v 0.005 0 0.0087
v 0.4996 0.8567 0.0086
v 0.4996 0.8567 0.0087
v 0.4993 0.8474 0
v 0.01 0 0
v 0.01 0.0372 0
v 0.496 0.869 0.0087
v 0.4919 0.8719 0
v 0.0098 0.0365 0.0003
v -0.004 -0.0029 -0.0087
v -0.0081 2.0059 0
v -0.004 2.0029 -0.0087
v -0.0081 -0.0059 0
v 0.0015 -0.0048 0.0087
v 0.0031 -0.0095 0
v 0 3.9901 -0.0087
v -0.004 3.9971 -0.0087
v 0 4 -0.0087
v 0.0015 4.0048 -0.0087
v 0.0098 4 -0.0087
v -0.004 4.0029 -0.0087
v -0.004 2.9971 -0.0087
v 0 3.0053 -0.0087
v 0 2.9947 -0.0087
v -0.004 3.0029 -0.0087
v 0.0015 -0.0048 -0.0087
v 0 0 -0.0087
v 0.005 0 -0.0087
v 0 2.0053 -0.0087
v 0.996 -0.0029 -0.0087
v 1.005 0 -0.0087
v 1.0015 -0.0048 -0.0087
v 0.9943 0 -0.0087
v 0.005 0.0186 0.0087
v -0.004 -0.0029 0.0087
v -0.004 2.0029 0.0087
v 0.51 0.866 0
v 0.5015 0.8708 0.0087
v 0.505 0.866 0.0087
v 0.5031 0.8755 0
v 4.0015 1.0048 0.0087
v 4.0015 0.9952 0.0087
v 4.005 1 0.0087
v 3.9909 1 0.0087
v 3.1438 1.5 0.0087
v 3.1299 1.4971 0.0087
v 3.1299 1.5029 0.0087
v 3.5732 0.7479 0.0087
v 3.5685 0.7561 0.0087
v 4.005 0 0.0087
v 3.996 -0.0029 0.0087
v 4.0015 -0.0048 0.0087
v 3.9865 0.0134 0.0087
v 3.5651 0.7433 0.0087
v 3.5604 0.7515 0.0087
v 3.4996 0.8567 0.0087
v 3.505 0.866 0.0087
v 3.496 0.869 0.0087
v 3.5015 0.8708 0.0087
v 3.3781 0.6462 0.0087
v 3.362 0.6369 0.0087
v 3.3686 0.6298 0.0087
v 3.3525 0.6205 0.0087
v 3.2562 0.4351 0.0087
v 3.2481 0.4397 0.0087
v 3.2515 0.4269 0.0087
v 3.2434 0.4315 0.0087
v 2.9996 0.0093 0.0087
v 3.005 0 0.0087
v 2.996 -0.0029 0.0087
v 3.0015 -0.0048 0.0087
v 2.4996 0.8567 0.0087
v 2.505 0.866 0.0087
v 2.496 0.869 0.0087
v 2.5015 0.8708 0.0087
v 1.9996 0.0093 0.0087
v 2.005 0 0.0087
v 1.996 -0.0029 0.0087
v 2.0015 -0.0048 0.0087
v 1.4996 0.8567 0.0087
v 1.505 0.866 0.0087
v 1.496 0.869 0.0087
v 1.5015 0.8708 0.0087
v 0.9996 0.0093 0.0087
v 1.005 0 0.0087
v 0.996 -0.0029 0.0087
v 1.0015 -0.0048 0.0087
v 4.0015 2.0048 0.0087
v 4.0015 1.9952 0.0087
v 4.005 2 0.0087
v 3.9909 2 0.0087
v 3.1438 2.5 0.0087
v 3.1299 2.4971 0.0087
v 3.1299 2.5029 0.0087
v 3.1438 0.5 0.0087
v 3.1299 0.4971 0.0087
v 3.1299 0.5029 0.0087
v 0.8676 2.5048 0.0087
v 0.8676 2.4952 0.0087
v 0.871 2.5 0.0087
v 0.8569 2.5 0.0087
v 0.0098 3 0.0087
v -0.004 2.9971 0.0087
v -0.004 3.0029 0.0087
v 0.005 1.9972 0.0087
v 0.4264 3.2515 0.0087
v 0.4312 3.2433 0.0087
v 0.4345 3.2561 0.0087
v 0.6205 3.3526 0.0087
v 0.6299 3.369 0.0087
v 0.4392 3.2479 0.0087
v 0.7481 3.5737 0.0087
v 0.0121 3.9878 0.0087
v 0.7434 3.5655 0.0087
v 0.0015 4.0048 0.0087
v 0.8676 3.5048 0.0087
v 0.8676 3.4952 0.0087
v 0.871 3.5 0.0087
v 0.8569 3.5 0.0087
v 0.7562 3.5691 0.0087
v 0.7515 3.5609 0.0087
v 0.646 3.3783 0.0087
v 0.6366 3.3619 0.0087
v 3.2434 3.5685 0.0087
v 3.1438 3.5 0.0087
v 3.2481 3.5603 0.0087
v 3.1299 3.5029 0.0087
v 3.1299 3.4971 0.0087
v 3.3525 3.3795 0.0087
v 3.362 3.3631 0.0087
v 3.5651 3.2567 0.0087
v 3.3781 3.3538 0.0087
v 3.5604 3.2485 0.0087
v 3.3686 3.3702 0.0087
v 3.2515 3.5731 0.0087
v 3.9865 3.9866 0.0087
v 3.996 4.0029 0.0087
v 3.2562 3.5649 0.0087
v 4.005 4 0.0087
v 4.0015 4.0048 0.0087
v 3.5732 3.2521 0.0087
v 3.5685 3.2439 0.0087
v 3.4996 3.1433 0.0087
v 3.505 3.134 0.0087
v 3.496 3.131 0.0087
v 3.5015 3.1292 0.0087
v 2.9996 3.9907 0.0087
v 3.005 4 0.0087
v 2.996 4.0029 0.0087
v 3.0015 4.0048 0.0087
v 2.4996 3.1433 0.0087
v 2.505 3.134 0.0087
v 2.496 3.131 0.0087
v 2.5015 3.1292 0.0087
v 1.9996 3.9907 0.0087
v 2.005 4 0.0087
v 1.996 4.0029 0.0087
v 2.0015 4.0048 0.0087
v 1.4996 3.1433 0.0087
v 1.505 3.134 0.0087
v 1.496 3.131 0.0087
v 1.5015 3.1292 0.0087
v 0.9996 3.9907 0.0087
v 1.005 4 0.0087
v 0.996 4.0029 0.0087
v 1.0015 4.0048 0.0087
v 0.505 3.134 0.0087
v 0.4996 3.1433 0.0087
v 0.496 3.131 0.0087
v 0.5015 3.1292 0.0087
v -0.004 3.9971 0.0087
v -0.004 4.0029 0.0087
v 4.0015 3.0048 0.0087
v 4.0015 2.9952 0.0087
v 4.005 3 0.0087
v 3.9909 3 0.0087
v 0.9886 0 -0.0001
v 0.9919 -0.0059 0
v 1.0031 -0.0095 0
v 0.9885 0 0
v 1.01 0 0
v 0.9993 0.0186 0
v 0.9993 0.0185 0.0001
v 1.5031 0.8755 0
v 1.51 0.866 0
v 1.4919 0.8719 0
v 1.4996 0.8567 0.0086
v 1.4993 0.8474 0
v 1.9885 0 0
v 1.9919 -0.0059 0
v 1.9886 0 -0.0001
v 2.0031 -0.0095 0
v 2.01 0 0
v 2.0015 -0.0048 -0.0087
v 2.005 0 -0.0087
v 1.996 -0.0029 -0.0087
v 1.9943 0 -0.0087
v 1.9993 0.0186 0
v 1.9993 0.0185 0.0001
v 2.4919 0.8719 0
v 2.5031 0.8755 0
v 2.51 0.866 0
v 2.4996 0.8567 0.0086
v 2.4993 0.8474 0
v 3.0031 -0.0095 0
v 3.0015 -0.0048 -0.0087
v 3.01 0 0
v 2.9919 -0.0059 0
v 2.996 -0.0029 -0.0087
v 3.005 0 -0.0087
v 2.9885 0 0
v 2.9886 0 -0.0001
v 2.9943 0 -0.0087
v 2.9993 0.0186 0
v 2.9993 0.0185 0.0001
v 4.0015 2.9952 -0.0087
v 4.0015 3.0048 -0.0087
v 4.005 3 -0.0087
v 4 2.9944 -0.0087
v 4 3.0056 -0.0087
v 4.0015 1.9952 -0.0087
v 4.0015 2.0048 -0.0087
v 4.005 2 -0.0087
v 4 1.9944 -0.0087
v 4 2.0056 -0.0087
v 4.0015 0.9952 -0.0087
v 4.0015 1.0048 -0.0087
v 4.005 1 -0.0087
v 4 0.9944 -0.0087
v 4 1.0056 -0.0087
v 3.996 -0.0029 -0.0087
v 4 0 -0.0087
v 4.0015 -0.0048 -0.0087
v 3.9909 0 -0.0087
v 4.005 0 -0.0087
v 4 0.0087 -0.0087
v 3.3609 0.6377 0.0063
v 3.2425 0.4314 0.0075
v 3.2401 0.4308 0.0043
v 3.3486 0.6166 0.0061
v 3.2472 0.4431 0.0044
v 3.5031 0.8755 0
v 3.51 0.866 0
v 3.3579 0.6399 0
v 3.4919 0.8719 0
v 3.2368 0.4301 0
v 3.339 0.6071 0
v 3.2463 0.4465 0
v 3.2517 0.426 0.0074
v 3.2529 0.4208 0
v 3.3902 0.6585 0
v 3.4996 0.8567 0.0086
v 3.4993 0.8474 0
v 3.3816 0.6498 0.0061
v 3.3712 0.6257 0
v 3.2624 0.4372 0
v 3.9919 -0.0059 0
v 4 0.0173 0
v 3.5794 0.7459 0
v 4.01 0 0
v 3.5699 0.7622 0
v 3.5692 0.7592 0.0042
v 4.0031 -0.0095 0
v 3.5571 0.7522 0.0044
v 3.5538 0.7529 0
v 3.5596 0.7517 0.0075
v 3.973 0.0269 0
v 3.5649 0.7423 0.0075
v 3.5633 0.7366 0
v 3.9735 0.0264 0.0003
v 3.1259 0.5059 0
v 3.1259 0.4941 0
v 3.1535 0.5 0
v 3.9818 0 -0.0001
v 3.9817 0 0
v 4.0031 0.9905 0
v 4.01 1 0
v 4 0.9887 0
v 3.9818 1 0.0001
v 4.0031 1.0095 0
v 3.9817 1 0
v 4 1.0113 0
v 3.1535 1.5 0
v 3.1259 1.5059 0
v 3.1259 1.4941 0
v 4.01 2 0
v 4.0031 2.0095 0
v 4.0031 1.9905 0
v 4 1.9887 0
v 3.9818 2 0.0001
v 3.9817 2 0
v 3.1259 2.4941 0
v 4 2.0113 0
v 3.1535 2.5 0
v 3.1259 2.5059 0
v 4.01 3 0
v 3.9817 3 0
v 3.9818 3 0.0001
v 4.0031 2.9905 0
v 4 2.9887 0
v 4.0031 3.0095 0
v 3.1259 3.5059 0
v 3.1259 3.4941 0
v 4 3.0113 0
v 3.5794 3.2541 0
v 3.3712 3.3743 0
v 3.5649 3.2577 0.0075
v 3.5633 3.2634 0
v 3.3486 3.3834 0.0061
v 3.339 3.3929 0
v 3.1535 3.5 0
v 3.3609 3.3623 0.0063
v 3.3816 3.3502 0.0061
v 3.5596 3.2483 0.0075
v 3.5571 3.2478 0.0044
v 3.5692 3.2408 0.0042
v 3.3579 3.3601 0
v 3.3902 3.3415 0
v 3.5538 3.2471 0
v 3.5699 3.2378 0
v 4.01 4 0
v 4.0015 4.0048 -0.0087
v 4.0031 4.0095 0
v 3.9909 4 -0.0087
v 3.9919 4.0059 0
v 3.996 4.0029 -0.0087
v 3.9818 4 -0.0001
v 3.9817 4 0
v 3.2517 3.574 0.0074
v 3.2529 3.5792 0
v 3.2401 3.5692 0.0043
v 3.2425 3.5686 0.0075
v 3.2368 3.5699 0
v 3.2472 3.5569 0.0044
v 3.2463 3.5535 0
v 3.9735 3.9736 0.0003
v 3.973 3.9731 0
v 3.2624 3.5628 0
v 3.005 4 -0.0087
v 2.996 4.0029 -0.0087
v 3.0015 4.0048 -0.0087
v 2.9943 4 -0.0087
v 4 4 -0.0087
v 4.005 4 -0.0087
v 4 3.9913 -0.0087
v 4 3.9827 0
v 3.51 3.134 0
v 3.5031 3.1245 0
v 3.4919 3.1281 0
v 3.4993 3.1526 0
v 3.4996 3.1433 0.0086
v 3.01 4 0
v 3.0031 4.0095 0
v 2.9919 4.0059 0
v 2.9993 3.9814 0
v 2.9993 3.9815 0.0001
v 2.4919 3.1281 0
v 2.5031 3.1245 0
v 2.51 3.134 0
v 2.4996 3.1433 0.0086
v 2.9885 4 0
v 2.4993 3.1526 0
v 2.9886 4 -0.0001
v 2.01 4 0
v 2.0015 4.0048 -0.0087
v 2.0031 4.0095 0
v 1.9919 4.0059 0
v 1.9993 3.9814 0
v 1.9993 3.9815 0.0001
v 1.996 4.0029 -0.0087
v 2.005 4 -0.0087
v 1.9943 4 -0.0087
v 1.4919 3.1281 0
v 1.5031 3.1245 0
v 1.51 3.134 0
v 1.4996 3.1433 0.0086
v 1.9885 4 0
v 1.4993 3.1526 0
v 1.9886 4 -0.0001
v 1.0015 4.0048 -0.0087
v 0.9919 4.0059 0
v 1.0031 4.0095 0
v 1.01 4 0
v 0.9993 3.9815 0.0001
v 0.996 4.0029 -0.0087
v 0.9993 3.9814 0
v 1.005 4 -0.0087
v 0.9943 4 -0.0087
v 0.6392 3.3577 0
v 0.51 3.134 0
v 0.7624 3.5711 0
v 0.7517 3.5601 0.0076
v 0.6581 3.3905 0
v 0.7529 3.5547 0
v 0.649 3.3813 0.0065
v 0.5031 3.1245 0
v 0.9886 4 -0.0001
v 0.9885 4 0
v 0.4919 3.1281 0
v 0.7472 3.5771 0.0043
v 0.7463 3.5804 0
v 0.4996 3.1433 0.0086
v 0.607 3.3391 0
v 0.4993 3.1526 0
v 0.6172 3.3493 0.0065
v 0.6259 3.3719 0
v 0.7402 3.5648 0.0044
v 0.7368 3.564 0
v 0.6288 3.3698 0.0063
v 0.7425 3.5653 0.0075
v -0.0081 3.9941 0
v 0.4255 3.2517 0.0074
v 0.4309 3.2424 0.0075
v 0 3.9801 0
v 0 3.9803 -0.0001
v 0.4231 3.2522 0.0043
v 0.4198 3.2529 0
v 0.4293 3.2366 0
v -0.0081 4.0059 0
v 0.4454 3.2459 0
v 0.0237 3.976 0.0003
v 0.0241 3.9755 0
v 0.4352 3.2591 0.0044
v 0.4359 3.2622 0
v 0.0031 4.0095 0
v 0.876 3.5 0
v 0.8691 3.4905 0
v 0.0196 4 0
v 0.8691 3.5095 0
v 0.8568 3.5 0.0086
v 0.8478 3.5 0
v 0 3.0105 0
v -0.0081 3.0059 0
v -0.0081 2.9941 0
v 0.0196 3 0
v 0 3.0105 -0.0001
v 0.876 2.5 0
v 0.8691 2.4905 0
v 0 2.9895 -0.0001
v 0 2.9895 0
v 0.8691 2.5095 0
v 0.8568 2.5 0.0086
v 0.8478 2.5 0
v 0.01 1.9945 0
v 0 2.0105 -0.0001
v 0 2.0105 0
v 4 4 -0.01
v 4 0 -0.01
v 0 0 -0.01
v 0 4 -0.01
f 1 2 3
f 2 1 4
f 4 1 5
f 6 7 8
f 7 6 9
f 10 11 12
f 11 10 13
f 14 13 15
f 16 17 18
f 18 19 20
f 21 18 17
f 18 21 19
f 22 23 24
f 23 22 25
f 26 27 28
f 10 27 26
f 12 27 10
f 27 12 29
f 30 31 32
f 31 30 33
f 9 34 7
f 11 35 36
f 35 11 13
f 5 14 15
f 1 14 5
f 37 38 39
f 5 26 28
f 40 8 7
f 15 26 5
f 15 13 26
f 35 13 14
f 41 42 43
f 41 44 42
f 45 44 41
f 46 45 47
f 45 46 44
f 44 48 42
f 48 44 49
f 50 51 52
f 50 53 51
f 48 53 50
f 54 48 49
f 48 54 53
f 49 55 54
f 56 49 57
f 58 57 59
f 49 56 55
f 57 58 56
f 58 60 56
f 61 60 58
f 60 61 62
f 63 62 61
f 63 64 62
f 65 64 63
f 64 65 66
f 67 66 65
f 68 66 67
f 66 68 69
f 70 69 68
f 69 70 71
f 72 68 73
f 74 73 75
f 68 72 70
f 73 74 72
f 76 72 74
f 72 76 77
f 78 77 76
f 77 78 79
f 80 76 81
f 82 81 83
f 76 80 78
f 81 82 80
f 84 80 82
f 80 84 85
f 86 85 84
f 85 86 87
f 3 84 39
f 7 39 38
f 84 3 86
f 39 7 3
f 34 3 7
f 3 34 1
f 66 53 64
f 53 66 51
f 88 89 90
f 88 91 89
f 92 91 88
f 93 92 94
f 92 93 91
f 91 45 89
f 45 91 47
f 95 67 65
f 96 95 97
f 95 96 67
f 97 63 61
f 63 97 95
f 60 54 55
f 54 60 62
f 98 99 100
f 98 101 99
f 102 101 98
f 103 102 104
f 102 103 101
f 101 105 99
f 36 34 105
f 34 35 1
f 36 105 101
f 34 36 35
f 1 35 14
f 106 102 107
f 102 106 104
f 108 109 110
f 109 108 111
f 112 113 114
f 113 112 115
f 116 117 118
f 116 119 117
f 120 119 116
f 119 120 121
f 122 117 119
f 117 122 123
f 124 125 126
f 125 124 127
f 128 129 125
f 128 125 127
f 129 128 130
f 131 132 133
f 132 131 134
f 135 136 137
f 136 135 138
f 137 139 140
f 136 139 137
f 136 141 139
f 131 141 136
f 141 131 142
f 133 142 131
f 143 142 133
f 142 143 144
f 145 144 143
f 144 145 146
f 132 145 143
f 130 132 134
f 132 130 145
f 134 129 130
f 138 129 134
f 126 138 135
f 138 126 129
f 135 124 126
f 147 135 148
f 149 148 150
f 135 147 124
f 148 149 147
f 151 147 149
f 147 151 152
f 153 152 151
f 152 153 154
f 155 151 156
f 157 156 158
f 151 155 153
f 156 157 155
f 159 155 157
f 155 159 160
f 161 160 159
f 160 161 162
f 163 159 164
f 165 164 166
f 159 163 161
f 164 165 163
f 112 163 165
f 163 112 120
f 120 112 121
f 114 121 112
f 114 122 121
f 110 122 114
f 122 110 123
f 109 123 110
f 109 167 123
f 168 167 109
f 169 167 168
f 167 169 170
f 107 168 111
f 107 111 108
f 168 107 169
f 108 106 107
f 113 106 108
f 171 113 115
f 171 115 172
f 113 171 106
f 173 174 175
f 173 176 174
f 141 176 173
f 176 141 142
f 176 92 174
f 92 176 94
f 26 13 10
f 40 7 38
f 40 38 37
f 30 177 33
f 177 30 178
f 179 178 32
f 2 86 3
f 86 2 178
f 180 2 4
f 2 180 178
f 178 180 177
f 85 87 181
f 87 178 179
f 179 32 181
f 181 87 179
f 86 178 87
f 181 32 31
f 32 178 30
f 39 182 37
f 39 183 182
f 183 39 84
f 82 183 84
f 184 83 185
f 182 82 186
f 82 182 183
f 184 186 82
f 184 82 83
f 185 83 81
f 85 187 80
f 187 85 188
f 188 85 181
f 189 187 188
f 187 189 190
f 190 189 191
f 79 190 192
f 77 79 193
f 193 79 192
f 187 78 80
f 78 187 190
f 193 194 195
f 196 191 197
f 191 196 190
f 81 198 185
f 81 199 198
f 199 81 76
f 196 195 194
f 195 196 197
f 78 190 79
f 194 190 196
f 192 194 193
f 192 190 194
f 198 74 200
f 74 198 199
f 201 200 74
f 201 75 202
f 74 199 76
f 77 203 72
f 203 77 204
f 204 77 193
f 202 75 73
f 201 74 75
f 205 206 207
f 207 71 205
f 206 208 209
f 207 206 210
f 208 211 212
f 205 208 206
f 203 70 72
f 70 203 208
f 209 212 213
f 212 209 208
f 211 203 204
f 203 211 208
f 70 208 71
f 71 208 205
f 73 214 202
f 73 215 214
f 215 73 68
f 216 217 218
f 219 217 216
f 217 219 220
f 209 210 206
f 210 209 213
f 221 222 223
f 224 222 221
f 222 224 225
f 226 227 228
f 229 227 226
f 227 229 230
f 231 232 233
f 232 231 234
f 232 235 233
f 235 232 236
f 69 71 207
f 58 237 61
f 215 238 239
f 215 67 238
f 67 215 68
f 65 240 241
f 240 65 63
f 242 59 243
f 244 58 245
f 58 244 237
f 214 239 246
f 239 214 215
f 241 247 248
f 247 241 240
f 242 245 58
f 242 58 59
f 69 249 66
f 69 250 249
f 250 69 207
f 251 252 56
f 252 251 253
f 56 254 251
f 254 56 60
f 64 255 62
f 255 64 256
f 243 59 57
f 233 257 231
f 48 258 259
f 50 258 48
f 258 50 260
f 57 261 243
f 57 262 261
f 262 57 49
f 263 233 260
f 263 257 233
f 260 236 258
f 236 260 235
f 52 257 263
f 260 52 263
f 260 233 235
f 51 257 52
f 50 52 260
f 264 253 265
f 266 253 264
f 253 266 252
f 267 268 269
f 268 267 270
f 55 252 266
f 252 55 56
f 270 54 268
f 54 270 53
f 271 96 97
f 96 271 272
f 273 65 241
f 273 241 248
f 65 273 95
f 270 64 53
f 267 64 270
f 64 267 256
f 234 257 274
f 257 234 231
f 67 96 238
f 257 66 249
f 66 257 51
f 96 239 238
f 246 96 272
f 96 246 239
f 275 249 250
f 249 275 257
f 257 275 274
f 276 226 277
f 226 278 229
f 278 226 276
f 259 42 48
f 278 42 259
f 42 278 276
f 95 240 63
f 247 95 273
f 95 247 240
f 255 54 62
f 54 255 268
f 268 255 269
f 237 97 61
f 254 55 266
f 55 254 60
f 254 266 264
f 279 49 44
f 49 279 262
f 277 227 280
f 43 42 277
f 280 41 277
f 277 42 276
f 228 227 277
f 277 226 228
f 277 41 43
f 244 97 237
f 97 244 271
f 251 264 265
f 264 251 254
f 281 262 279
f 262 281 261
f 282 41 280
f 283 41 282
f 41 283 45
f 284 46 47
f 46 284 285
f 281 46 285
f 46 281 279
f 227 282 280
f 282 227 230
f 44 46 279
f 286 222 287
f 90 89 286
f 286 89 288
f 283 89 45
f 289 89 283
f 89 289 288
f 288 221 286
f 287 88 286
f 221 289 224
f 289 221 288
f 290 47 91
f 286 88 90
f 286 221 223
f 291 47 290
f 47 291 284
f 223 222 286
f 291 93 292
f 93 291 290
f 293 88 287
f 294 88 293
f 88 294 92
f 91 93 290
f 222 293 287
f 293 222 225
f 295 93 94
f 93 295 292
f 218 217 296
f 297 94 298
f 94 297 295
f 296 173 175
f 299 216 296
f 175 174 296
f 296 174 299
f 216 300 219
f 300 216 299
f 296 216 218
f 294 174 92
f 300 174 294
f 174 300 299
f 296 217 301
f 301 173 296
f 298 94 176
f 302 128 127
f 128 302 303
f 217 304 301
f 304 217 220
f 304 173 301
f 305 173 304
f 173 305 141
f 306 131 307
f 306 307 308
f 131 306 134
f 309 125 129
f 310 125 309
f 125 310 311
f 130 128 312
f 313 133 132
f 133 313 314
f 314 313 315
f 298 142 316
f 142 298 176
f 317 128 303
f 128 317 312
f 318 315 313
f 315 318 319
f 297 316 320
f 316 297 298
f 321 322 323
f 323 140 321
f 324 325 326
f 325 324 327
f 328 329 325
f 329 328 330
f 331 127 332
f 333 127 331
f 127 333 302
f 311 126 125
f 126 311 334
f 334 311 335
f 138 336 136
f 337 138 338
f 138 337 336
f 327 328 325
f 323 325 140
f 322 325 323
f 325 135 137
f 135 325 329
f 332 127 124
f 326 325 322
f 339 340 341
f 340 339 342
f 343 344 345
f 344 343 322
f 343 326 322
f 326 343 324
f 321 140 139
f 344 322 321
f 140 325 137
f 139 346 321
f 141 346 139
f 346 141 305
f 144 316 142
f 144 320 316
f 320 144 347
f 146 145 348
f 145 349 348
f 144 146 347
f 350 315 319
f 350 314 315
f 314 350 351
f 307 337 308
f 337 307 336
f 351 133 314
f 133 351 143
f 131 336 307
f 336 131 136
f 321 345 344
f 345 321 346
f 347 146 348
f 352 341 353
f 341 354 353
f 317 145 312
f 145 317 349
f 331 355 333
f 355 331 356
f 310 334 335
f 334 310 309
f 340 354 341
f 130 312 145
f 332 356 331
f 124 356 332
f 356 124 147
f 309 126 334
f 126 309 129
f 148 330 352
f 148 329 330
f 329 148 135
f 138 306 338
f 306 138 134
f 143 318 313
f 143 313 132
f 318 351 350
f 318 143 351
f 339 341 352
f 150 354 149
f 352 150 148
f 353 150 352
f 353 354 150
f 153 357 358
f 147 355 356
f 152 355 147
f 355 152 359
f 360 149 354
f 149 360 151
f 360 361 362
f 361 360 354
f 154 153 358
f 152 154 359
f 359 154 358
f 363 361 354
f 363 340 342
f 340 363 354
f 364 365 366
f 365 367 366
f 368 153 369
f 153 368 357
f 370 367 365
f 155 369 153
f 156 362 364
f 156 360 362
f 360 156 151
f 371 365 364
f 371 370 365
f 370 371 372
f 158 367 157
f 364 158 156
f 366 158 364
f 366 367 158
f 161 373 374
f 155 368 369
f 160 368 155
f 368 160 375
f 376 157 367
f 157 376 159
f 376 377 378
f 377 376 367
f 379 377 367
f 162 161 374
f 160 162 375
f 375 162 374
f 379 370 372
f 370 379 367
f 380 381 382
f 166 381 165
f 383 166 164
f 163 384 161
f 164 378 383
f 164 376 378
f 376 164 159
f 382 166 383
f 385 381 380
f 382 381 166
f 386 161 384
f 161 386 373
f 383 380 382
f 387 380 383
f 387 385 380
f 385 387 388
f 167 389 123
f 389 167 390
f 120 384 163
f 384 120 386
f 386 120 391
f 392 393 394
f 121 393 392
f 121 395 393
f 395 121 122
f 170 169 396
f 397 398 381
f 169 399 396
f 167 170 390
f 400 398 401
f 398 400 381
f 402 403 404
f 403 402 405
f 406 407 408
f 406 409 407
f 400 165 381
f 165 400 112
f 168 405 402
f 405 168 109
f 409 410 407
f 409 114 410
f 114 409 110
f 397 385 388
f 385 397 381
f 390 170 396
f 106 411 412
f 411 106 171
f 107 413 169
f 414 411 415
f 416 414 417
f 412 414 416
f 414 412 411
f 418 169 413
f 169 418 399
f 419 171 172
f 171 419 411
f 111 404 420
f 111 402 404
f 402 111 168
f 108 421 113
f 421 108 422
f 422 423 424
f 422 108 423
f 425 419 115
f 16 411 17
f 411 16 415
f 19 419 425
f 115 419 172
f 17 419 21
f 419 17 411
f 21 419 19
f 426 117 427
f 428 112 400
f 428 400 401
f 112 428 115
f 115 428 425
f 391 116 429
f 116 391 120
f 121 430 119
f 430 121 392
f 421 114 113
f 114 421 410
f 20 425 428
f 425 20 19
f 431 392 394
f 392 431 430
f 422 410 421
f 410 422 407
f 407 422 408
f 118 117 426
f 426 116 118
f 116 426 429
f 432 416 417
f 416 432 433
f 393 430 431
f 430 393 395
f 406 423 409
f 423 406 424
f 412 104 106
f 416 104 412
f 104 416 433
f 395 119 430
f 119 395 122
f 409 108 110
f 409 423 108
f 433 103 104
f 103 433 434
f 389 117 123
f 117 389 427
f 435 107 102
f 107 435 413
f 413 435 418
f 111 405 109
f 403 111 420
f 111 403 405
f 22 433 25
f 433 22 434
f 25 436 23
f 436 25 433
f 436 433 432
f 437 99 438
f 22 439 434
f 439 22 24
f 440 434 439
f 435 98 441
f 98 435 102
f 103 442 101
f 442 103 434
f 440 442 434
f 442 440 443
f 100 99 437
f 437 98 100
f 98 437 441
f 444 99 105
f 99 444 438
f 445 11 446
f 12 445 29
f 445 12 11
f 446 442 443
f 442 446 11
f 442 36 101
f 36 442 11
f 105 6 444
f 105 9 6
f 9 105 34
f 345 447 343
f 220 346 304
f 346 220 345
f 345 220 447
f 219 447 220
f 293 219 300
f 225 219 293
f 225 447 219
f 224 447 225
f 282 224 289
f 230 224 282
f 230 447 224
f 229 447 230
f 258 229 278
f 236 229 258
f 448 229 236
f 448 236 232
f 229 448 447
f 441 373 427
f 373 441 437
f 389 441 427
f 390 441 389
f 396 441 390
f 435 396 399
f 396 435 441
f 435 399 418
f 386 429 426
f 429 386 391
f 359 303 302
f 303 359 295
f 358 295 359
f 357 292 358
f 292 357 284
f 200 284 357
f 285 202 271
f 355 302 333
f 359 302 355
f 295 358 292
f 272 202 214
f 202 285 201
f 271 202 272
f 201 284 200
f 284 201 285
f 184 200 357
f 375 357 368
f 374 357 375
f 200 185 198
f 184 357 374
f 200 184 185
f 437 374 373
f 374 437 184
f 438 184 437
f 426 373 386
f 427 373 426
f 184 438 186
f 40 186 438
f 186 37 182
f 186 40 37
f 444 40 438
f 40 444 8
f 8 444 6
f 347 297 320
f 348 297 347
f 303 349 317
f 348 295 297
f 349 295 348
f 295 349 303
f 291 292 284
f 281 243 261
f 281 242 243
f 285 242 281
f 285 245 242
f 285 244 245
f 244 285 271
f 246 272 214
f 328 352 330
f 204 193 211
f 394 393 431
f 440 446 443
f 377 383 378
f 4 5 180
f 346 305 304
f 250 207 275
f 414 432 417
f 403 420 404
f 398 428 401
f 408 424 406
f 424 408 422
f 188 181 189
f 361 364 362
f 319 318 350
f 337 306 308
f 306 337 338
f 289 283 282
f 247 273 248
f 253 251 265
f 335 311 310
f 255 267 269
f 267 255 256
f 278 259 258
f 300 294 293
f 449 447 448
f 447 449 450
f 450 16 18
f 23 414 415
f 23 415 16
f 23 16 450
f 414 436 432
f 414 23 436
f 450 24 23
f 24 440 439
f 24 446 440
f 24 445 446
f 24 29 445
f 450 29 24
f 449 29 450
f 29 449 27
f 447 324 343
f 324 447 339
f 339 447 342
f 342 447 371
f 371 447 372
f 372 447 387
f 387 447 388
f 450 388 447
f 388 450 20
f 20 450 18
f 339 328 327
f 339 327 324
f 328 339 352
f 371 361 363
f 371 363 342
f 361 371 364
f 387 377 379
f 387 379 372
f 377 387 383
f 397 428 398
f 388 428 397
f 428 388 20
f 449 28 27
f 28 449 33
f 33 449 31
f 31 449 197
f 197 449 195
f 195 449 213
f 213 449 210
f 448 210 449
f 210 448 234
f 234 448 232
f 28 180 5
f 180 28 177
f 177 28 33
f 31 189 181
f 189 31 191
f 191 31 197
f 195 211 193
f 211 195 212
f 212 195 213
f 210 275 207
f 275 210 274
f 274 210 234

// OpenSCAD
hull(){
    translate([0.0, 0.0]) sphere(0.01);
    translate([0.5, 0.86602540378]) sphere(0.01);
}
hull(){
    translate([0.5, 0.86602540378]) sphere(0.01);
    translate([1.0, 0.0]) sphere(0.01);
}
hull(){
    translate([1.0, 0.0]) sphere(0.01);
    translate([1.5, 0.86602540378]) sphere(0.01);
}
hull(){
    translate([1.5, 0.86602540378]) sphere(0.01);
    translate([2.0, 0.0]) sphere(0.01);
}
hull(){
    translate([2.0, 0.0]) sphere(0.01);
    translate([2.5, 0.86602540378]) sphere(0.01);
}
hull(){
    translate([2.5, 0.86602540378]) sphere(0.01);
    translate([3.0, 0.0]) sphere(0.01);
}
hull(){
    translate([3.0, 0.0]) sphere(0.01);
    translate([3.5, 0.86602540378]) sphere(0.01);
}
hull(){
    translate([3.5, 0.86602540378]) sphere(0.01);
    translate([4.0, 0.0]) sphere(0.01);
}
hull(){
    translate([4.0, 0.0]) sphere(0.01);
    translate([3.13397459622, 0.5]) sphere(0.01);
}
hull(){
    translate([3.13397459622, 0.5]) sphere(0.01);
    translate([4.0, 1.0]) sphere(0.01);
}
hull(){
    translate([4.0, 1.0]) sphere(0.01);
    translate([3.13397459622, 1.5]) sphere(0.01);
}
hull(){
    translate([3.13397459622, 1.5]) sphere(0.01);
    translate([4.0, 2.0]) sphere(0.01);
}
hull(){
    translate([4.0, 2.0]) sphere(0.01);
    translate([3.13397459622, 2.5]) sphere(0.01);
}
hull(){
    translate([3.13397459622, 2.5]) sphere(0.01);
    translate([4.0, 3.0]) sphere(0.01);
}
hull(){
    translate([4.0, 3.0]) sphere(0.01);
    translate([3.13397459622, 3.5]) sphere(0.01);
}
hull(){
    translate([3.13397459622, 3.5]) sphere(0.01);
    translate([4.0, 4.0]) sphere(0.01);
}
hull(){
    translate([4.0, 4.0]) sphere(0.01);
    translate([3.5, 3.13397459622]) sphere(0.01);
}
hull(){
    translate([3.5, 3.13397459622]) sphere(0.01);
    translate([3.0, 4.0]) sphere(0.01);
}
hull(){
    translate([3.0, 4.0]) sphere(0.01);
    translate([2.5, 3.13397459622]) sphere(0.01);
}
hull(){
    translate([2.5, 3.13397459622]) sphere(0.01);
    translate([2.0, 4.0]) sphere(0.01);
}
hull(){
    translate([2.0, 4.0]) sphere(0.01);
    translate([1.5, 3.13397459622]) sphere(0.01);
}
hull(){
    translate([1.5, 3.13397459622]) sphere(0.01);
    translate([1.0, 4.0]) sphere(0.01);
}
hull(){
    translate([1.0, 4.0]) sphere(0.01);
    translate([0.5, 3.13397459622]) sphere(0.01);
}
hull(){
    translate([0.5, 3.13397459622]) sphere(0.01);
    translate([0.0, 4.0]) sphere(0.01);
}
hull(){
    translate([0.0, 4.0]) sphere(0.01);
    translate([0.86602540378, 3.5]) sphere(0.01);
}
hull(){
    translate([0.86602540378, 3.5]) sphere(0.01);
    translate([0.0, 3.0]) sphere(0.01);
}
hull(){
    translate([0.0, 3.0]) sphere(0.01);
    translate([0.86602540378, 2.5]) sphere(0.01);
}
hull(){
    translate([0.86602540378, 2.5]) sphere(0.01);
    translate([0.0, 2.0]) sphere(0.01);
}
hull(){
    translate([0.0, 2.0]) sphere(0.01);
    translate([0.0, 1.0]) sphere(0.01);
}
hull(){
    translate([0.0, 1.0]) sphere(0.01);
    translate([0.0, 0.0]) sphere(0.01);
}
translate([0,0,-0.01]) color([0.1,0.1,0.1]) cube([4,4,0.01]);
